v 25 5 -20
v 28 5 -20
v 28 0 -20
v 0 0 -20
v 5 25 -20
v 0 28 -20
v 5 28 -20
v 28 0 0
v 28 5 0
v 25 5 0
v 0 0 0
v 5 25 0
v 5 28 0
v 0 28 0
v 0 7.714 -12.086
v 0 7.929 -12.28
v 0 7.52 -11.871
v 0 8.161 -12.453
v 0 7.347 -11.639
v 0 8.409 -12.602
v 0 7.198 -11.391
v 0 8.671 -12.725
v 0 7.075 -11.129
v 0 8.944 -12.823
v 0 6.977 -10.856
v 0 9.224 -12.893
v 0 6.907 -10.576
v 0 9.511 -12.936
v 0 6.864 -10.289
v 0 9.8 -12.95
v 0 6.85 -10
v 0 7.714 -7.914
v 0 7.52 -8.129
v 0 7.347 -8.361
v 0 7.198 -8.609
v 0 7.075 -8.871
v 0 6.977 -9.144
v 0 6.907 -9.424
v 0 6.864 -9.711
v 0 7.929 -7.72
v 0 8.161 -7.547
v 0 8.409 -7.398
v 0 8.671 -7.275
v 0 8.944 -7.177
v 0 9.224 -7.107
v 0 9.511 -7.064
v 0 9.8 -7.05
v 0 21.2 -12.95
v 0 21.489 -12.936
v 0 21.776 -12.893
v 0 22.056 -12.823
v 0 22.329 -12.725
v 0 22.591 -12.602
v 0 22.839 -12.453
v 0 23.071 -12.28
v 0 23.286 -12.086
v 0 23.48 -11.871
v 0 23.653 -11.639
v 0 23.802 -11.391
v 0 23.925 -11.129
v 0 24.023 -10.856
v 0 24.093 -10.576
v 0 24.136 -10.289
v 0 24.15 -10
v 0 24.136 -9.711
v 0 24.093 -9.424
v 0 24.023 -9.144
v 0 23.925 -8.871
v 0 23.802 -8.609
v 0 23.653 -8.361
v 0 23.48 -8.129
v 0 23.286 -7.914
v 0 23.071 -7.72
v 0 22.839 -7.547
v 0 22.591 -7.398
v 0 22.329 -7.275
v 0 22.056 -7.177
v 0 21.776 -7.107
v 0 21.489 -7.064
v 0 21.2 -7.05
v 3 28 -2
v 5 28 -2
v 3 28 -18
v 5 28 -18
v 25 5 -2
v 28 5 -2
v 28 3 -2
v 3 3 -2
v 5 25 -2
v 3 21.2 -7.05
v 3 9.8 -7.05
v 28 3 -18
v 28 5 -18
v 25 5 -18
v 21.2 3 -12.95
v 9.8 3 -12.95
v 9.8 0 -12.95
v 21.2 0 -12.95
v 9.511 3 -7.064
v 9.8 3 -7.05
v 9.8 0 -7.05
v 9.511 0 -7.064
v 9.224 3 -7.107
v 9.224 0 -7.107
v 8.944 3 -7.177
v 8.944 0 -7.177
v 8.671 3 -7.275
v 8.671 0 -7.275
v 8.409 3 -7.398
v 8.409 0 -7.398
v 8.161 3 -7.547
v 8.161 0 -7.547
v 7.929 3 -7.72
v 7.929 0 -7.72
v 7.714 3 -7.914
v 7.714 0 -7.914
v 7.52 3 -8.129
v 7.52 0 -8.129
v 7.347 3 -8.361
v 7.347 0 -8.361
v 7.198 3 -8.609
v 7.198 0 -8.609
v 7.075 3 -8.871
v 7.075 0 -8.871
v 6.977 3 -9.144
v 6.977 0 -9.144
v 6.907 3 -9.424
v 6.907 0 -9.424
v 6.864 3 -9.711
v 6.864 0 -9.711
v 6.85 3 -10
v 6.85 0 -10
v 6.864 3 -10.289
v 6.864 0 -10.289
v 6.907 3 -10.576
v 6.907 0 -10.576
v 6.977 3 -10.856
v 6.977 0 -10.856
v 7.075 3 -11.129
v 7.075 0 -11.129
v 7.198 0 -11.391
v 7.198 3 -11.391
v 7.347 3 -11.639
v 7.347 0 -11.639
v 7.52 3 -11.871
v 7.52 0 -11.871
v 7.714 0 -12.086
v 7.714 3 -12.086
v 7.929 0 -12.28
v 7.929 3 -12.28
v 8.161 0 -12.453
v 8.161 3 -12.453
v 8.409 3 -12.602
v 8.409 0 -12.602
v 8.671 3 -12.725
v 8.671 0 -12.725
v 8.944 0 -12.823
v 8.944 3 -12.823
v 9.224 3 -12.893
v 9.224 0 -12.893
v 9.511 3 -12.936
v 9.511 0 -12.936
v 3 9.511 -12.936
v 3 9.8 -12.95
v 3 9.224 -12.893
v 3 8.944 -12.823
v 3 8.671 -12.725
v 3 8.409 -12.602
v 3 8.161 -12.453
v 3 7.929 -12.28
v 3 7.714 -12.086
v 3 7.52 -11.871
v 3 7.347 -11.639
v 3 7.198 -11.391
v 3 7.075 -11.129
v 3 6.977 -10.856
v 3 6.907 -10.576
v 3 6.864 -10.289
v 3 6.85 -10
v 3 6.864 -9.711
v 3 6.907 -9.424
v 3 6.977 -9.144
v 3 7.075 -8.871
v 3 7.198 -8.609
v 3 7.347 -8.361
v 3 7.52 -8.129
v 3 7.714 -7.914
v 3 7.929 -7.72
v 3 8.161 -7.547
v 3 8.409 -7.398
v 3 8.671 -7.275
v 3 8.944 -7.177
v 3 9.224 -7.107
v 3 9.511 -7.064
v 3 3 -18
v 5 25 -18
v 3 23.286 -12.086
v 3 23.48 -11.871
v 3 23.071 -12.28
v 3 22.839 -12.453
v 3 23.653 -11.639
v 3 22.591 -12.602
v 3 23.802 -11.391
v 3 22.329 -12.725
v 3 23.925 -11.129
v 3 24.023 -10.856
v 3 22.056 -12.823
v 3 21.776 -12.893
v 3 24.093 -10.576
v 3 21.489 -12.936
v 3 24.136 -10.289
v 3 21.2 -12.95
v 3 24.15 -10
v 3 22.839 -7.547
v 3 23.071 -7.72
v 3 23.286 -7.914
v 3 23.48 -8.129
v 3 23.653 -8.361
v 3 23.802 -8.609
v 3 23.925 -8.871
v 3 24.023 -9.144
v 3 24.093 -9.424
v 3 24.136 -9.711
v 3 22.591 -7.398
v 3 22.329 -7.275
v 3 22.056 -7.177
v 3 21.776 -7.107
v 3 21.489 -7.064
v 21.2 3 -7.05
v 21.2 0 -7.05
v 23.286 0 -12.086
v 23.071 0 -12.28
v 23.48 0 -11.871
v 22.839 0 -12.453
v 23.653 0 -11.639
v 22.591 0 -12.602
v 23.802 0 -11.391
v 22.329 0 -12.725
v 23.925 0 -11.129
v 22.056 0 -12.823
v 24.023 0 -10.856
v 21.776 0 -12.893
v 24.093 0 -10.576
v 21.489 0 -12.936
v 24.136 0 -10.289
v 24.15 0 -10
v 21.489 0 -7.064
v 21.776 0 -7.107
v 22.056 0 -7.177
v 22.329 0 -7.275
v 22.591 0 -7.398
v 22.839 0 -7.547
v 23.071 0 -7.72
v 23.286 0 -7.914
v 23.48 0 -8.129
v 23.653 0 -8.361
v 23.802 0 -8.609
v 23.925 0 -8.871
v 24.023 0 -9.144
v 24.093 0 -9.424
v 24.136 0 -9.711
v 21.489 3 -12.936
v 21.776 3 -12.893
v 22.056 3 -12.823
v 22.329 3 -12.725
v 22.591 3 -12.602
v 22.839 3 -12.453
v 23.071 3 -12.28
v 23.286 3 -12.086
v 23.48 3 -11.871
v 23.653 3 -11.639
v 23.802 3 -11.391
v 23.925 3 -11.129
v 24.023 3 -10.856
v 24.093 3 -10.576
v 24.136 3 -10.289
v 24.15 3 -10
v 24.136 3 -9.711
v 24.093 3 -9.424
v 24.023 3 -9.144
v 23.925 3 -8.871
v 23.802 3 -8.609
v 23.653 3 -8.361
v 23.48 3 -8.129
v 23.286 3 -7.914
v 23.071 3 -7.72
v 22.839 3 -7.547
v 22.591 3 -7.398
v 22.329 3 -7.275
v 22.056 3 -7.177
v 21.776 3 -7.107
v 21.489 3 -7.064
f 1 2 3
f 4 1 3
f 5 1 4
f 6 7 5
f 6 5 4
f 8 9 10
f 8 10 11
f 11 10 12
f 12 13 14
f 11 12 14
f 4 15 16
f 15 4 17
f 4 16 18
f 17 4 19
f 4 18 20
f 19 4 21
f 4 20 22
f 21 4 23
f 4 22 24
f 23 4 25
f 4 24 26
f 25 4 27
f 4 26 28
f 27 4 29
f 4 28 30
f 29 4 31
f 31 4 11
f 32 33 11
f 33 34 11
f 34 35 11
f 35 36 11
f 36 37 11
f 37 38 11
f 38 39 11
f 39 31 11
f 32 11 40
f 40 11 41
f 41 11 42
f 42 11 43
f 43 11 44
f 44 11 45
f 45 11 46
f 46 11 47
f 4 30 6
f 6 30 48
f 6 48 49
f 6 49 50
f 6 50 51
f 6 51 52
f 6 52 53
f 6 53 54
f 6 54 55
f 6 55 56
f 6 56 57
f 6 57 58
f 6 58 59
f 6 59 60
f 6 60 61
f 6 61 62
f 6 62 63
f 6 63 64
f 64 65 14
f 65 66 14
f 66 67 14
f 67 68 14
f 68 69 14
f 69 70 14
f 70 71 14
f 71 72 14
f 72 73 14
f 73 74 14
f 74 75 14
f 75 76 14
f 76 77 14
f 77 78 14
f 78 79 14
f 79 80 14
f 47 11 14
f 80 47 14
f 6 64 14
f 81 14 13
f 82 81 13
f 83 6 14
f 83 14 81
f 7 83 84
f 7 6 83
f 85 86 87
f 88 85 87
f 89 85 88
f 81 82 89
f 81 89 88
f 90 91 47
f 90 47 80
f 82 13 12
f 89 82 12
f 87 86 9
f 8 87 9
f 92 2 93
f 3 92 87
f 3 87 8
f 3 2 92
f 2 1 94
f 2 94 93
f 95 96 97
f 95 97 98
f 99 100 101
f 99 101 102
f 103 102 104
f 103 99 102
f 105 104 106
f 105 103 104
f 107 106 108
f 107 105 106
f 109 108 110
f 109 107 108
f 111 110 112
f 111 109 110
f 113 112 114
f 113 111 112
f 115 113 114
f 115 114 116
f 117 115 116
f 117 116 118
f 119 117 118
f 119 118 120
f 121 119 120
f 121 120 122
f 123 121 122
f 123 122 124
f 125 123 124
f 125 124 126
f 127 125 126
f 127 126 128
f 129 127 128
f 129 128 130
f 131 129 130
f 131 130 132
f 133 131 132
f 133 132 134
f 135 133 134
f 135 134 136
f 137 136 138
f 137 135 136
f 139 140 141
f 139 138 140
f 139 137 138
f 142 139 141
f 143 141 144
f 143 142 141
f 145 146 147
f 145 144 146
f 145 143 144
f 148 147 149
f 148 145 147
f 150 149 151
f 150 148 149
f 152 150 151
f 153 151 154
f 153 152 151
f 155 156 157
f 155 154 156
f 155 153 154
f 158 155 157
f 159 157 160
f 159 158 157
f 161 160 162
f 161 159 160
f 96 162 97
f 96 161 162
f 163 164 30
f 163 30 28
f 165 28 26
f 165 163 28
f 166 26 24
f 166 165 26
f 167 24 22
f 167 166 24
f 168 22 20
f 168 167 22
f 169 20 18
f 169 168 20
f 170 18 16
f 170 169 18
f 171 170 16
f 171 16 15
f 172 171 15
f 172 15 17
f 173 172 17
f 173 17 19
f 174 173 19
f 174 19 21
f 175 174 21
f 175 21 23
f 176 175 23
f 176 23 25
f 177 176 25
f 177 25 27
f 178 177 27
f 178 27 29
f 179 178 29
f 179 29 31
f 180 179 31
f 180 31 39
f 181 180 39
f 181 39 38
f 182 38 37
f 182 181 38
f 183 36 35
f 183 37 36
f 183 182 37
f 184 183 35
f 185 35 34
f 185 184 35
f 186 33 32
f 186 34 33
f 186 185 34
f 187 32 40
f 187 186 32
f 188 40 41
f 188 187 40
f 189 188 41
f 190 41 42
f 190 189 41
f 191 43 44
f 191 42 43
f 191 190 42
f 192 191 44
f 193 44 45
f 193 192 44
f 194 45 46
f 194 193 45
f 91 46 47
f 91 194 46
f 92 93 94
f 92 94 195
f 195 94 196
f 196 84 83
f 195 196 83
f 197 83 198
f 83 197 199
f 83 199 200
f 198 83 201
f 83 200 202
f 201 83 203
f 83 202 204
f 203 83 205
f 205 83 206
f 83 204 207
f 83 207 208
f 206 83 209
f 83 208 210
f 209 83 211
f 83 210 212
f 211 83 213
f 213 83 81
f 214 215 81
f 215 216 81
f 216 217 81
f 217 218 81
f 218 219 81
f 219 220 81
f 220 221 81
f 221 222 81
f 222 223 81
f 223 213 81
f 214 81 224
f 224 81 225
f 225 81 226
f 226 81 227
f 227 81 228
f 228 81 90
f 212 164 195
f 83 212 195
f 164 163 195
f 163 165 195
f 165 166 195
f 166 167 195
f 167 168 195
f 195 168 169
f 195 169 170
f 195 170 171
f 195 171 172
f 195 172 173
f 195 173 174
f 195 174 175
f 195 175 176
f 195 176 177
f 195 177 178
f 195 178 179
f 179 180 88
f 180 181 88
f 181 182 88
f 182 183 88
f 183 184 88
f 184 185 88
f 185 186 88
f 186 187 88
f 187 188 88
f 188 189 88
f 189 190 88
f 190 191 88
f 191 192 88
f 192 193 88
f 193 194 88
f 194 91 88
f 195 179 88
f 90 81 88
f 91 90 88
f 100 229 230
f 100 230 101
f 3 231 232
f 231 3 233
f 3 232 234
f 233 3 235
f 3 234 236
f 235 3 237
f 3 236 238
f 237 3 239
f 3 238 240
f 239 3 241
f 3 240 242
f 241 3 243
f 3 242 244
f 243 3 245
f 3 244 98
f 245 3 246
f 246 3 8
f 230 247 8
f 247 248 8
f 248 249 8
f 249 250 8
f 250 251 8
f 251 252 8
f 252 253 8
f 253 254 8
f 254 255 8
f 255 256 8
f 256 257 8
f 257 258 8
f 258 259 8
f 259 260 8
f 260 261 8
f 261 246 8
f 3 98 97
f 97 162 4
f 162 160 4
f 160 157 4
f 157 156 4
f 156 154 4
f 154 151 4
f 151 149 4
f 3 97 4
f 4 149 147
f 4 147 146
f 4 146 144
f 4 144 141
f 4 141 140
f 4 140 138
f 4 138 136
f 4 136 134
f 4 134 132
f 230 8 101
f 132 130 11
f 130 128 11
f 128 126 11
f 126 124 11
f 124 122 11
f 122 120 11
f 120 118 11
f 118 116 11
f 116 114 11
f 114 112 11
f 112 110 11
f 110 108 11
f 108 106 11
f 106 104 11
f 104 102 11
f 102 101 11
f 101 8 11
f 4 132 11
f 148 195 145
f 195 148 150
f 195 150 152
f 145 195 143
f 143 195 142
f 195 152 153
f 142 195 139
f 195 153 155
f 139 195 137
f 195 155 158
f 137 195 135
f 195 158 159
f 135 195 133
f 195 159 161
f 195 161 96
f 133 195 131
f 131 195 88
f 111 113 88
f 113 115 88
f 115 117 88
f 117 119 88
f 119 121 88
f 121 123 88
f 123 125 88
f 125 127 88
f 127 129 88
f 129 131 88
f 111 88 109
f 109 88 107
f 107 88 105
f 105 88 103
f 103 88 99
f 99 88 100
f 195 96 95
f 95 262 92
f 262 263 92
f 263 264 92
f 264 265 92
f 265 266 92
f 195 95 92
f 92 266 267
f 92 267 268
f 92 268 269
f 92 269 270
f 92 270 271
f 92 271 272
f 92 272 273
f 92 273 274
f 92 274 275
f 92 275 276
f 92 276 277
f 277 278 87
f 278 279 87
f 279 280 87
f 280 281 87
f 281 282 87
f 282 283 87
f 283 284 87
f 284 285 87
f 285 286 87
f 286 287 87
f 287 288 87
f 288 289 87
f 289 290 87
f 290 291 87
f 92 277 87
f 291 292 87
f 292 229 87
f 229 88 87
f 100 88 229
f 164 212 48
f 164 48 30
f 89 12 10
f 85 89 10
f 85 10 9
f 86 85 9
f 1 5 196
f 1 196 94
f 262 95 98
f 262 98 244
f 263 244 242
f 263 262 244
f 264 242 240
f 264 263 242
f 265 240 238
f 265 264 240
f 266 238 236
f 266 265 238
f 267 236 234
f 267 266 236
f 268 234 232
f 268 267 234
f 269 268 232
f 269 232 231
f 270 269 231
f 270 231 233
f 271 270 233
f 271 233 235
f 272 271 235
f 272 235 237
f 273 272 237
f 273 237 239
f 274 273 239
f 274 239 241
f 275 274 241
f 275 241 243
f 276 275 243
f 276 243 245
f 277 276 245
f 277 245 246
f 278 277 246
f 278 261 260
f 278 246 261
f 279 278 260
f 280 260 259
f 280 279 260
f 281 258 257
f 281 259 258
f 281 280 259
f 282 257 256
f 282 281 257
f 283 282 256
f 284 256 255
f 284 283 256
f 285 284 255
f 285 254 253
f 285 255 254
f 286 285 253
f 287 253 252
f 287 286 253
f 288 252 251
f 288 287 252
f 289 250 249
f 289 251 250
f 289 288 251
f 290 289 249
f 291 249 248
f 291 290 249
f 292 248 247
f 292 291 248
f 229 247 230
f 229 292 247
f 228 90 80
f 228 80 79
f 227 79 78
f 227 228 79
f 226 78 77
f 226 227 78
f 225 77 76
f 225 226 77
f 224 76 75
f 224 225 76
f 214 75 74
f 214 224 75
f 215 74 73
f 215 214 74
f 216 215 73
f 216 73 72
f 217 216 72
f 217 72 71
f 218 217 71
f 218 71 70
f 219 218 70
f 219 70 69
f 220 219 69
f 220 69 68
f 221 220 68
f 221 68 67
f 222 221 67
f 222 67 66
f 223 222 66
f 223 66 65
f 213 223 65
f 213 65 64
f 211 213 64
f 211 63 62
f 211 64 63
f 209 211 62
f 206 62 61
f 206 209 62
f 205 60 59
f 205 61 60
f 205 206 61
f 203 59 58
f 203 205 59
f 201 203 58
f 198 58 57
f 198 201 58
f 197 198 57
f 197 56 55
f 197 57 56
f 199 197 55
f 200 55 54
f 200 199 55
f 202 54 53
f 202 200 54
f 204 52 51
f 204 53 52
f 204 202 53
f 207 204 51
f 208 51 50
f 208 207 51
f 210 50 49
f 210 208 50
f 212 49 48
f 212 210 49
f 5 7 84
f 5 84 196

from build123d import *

# Parameters (mm, degrees)
BOSS_EXTRUDE1_DEPTH = 20
CUT_EXTRUDE1_DEPTH  = 10
CUT_EXTRUDE2_DEPTH  = 10
BOSS_EXTRUDE2_DEPTH = 2


with BuildPart() as part:
    # Sketch2 → Boss-Extrude1 (new body)
    with BuildSketch(Plane.XY):
        Polygon((0, 0), (0, 28), (3, 28), (3, 3), (28, 3), (28, 0), align=None)
    extrude(amount=-BOSS_EXTRUDE1_DEPTH)

    # Sketch4 → Cut-Extrude1 (cut)
    with BuildSketch(Plane(origin=(0, 3, 0), x_dir=(1, 0, 0), z_dir=(0, 1, 0))):
        with BuildLine():
            Line((9.8, 12.95), (21.2, 12.95))
            ThreePointArc((21.2, 12.95), (24.15, 10), (21.2, 7.05))
            Line((21.2, 7.05), (9.8, 7.05))
            ThreePointArc((9.8, 7.05), (6.85, 10), (9.8, 12.95))
        make_face()
    extrude(amount=-CUT_EXTRUDE1_DEPTH, mode=Mode.SUBTRACT)

    # Sketch5 → Cut-Extrude2 (cut)
    with BuildSketch(Plane(origin=(3, 0, 0), x_dir=(0, 0, -1), z_dir=(1, 0, 0))):
        with BuildLine():
            Line((12.95, 21.2), (12.95, 9.8))
            ThreePointArc((12.95, 9.8), (10, 6.85), (7.05, 9.8))
            Line((7.05, 9.8), (7.05, 21.2))
            ThreePointArc((7.05, 21.2), (10, 24.15), (12.95, 21.2))
        make_face()
    extrude(amount=-CUT_EXTRUDE2_DEPTH, mode=Mode.SUBTRACT)

    # Sketch6 → Boss-Extrude2 (add)
    with BuildSketch(Plane.XY):
        Polygon((3, 28), (5, 28), (5, 25), (25, 5), (28, 5), (28, 3), (3, 3), align=None)
    boss_extrude2 = extrude(amount=-BOSS_EXTRUDE2_DEPTH)

    # Mirror4: Boss-Extrude2 across plane
    add(boss_extrude2.mirror(Plane(origin=(0, 0, -10), x_dir=(1, 0, 0), z_dir=(0, 0, -1))))


solid = part.part
